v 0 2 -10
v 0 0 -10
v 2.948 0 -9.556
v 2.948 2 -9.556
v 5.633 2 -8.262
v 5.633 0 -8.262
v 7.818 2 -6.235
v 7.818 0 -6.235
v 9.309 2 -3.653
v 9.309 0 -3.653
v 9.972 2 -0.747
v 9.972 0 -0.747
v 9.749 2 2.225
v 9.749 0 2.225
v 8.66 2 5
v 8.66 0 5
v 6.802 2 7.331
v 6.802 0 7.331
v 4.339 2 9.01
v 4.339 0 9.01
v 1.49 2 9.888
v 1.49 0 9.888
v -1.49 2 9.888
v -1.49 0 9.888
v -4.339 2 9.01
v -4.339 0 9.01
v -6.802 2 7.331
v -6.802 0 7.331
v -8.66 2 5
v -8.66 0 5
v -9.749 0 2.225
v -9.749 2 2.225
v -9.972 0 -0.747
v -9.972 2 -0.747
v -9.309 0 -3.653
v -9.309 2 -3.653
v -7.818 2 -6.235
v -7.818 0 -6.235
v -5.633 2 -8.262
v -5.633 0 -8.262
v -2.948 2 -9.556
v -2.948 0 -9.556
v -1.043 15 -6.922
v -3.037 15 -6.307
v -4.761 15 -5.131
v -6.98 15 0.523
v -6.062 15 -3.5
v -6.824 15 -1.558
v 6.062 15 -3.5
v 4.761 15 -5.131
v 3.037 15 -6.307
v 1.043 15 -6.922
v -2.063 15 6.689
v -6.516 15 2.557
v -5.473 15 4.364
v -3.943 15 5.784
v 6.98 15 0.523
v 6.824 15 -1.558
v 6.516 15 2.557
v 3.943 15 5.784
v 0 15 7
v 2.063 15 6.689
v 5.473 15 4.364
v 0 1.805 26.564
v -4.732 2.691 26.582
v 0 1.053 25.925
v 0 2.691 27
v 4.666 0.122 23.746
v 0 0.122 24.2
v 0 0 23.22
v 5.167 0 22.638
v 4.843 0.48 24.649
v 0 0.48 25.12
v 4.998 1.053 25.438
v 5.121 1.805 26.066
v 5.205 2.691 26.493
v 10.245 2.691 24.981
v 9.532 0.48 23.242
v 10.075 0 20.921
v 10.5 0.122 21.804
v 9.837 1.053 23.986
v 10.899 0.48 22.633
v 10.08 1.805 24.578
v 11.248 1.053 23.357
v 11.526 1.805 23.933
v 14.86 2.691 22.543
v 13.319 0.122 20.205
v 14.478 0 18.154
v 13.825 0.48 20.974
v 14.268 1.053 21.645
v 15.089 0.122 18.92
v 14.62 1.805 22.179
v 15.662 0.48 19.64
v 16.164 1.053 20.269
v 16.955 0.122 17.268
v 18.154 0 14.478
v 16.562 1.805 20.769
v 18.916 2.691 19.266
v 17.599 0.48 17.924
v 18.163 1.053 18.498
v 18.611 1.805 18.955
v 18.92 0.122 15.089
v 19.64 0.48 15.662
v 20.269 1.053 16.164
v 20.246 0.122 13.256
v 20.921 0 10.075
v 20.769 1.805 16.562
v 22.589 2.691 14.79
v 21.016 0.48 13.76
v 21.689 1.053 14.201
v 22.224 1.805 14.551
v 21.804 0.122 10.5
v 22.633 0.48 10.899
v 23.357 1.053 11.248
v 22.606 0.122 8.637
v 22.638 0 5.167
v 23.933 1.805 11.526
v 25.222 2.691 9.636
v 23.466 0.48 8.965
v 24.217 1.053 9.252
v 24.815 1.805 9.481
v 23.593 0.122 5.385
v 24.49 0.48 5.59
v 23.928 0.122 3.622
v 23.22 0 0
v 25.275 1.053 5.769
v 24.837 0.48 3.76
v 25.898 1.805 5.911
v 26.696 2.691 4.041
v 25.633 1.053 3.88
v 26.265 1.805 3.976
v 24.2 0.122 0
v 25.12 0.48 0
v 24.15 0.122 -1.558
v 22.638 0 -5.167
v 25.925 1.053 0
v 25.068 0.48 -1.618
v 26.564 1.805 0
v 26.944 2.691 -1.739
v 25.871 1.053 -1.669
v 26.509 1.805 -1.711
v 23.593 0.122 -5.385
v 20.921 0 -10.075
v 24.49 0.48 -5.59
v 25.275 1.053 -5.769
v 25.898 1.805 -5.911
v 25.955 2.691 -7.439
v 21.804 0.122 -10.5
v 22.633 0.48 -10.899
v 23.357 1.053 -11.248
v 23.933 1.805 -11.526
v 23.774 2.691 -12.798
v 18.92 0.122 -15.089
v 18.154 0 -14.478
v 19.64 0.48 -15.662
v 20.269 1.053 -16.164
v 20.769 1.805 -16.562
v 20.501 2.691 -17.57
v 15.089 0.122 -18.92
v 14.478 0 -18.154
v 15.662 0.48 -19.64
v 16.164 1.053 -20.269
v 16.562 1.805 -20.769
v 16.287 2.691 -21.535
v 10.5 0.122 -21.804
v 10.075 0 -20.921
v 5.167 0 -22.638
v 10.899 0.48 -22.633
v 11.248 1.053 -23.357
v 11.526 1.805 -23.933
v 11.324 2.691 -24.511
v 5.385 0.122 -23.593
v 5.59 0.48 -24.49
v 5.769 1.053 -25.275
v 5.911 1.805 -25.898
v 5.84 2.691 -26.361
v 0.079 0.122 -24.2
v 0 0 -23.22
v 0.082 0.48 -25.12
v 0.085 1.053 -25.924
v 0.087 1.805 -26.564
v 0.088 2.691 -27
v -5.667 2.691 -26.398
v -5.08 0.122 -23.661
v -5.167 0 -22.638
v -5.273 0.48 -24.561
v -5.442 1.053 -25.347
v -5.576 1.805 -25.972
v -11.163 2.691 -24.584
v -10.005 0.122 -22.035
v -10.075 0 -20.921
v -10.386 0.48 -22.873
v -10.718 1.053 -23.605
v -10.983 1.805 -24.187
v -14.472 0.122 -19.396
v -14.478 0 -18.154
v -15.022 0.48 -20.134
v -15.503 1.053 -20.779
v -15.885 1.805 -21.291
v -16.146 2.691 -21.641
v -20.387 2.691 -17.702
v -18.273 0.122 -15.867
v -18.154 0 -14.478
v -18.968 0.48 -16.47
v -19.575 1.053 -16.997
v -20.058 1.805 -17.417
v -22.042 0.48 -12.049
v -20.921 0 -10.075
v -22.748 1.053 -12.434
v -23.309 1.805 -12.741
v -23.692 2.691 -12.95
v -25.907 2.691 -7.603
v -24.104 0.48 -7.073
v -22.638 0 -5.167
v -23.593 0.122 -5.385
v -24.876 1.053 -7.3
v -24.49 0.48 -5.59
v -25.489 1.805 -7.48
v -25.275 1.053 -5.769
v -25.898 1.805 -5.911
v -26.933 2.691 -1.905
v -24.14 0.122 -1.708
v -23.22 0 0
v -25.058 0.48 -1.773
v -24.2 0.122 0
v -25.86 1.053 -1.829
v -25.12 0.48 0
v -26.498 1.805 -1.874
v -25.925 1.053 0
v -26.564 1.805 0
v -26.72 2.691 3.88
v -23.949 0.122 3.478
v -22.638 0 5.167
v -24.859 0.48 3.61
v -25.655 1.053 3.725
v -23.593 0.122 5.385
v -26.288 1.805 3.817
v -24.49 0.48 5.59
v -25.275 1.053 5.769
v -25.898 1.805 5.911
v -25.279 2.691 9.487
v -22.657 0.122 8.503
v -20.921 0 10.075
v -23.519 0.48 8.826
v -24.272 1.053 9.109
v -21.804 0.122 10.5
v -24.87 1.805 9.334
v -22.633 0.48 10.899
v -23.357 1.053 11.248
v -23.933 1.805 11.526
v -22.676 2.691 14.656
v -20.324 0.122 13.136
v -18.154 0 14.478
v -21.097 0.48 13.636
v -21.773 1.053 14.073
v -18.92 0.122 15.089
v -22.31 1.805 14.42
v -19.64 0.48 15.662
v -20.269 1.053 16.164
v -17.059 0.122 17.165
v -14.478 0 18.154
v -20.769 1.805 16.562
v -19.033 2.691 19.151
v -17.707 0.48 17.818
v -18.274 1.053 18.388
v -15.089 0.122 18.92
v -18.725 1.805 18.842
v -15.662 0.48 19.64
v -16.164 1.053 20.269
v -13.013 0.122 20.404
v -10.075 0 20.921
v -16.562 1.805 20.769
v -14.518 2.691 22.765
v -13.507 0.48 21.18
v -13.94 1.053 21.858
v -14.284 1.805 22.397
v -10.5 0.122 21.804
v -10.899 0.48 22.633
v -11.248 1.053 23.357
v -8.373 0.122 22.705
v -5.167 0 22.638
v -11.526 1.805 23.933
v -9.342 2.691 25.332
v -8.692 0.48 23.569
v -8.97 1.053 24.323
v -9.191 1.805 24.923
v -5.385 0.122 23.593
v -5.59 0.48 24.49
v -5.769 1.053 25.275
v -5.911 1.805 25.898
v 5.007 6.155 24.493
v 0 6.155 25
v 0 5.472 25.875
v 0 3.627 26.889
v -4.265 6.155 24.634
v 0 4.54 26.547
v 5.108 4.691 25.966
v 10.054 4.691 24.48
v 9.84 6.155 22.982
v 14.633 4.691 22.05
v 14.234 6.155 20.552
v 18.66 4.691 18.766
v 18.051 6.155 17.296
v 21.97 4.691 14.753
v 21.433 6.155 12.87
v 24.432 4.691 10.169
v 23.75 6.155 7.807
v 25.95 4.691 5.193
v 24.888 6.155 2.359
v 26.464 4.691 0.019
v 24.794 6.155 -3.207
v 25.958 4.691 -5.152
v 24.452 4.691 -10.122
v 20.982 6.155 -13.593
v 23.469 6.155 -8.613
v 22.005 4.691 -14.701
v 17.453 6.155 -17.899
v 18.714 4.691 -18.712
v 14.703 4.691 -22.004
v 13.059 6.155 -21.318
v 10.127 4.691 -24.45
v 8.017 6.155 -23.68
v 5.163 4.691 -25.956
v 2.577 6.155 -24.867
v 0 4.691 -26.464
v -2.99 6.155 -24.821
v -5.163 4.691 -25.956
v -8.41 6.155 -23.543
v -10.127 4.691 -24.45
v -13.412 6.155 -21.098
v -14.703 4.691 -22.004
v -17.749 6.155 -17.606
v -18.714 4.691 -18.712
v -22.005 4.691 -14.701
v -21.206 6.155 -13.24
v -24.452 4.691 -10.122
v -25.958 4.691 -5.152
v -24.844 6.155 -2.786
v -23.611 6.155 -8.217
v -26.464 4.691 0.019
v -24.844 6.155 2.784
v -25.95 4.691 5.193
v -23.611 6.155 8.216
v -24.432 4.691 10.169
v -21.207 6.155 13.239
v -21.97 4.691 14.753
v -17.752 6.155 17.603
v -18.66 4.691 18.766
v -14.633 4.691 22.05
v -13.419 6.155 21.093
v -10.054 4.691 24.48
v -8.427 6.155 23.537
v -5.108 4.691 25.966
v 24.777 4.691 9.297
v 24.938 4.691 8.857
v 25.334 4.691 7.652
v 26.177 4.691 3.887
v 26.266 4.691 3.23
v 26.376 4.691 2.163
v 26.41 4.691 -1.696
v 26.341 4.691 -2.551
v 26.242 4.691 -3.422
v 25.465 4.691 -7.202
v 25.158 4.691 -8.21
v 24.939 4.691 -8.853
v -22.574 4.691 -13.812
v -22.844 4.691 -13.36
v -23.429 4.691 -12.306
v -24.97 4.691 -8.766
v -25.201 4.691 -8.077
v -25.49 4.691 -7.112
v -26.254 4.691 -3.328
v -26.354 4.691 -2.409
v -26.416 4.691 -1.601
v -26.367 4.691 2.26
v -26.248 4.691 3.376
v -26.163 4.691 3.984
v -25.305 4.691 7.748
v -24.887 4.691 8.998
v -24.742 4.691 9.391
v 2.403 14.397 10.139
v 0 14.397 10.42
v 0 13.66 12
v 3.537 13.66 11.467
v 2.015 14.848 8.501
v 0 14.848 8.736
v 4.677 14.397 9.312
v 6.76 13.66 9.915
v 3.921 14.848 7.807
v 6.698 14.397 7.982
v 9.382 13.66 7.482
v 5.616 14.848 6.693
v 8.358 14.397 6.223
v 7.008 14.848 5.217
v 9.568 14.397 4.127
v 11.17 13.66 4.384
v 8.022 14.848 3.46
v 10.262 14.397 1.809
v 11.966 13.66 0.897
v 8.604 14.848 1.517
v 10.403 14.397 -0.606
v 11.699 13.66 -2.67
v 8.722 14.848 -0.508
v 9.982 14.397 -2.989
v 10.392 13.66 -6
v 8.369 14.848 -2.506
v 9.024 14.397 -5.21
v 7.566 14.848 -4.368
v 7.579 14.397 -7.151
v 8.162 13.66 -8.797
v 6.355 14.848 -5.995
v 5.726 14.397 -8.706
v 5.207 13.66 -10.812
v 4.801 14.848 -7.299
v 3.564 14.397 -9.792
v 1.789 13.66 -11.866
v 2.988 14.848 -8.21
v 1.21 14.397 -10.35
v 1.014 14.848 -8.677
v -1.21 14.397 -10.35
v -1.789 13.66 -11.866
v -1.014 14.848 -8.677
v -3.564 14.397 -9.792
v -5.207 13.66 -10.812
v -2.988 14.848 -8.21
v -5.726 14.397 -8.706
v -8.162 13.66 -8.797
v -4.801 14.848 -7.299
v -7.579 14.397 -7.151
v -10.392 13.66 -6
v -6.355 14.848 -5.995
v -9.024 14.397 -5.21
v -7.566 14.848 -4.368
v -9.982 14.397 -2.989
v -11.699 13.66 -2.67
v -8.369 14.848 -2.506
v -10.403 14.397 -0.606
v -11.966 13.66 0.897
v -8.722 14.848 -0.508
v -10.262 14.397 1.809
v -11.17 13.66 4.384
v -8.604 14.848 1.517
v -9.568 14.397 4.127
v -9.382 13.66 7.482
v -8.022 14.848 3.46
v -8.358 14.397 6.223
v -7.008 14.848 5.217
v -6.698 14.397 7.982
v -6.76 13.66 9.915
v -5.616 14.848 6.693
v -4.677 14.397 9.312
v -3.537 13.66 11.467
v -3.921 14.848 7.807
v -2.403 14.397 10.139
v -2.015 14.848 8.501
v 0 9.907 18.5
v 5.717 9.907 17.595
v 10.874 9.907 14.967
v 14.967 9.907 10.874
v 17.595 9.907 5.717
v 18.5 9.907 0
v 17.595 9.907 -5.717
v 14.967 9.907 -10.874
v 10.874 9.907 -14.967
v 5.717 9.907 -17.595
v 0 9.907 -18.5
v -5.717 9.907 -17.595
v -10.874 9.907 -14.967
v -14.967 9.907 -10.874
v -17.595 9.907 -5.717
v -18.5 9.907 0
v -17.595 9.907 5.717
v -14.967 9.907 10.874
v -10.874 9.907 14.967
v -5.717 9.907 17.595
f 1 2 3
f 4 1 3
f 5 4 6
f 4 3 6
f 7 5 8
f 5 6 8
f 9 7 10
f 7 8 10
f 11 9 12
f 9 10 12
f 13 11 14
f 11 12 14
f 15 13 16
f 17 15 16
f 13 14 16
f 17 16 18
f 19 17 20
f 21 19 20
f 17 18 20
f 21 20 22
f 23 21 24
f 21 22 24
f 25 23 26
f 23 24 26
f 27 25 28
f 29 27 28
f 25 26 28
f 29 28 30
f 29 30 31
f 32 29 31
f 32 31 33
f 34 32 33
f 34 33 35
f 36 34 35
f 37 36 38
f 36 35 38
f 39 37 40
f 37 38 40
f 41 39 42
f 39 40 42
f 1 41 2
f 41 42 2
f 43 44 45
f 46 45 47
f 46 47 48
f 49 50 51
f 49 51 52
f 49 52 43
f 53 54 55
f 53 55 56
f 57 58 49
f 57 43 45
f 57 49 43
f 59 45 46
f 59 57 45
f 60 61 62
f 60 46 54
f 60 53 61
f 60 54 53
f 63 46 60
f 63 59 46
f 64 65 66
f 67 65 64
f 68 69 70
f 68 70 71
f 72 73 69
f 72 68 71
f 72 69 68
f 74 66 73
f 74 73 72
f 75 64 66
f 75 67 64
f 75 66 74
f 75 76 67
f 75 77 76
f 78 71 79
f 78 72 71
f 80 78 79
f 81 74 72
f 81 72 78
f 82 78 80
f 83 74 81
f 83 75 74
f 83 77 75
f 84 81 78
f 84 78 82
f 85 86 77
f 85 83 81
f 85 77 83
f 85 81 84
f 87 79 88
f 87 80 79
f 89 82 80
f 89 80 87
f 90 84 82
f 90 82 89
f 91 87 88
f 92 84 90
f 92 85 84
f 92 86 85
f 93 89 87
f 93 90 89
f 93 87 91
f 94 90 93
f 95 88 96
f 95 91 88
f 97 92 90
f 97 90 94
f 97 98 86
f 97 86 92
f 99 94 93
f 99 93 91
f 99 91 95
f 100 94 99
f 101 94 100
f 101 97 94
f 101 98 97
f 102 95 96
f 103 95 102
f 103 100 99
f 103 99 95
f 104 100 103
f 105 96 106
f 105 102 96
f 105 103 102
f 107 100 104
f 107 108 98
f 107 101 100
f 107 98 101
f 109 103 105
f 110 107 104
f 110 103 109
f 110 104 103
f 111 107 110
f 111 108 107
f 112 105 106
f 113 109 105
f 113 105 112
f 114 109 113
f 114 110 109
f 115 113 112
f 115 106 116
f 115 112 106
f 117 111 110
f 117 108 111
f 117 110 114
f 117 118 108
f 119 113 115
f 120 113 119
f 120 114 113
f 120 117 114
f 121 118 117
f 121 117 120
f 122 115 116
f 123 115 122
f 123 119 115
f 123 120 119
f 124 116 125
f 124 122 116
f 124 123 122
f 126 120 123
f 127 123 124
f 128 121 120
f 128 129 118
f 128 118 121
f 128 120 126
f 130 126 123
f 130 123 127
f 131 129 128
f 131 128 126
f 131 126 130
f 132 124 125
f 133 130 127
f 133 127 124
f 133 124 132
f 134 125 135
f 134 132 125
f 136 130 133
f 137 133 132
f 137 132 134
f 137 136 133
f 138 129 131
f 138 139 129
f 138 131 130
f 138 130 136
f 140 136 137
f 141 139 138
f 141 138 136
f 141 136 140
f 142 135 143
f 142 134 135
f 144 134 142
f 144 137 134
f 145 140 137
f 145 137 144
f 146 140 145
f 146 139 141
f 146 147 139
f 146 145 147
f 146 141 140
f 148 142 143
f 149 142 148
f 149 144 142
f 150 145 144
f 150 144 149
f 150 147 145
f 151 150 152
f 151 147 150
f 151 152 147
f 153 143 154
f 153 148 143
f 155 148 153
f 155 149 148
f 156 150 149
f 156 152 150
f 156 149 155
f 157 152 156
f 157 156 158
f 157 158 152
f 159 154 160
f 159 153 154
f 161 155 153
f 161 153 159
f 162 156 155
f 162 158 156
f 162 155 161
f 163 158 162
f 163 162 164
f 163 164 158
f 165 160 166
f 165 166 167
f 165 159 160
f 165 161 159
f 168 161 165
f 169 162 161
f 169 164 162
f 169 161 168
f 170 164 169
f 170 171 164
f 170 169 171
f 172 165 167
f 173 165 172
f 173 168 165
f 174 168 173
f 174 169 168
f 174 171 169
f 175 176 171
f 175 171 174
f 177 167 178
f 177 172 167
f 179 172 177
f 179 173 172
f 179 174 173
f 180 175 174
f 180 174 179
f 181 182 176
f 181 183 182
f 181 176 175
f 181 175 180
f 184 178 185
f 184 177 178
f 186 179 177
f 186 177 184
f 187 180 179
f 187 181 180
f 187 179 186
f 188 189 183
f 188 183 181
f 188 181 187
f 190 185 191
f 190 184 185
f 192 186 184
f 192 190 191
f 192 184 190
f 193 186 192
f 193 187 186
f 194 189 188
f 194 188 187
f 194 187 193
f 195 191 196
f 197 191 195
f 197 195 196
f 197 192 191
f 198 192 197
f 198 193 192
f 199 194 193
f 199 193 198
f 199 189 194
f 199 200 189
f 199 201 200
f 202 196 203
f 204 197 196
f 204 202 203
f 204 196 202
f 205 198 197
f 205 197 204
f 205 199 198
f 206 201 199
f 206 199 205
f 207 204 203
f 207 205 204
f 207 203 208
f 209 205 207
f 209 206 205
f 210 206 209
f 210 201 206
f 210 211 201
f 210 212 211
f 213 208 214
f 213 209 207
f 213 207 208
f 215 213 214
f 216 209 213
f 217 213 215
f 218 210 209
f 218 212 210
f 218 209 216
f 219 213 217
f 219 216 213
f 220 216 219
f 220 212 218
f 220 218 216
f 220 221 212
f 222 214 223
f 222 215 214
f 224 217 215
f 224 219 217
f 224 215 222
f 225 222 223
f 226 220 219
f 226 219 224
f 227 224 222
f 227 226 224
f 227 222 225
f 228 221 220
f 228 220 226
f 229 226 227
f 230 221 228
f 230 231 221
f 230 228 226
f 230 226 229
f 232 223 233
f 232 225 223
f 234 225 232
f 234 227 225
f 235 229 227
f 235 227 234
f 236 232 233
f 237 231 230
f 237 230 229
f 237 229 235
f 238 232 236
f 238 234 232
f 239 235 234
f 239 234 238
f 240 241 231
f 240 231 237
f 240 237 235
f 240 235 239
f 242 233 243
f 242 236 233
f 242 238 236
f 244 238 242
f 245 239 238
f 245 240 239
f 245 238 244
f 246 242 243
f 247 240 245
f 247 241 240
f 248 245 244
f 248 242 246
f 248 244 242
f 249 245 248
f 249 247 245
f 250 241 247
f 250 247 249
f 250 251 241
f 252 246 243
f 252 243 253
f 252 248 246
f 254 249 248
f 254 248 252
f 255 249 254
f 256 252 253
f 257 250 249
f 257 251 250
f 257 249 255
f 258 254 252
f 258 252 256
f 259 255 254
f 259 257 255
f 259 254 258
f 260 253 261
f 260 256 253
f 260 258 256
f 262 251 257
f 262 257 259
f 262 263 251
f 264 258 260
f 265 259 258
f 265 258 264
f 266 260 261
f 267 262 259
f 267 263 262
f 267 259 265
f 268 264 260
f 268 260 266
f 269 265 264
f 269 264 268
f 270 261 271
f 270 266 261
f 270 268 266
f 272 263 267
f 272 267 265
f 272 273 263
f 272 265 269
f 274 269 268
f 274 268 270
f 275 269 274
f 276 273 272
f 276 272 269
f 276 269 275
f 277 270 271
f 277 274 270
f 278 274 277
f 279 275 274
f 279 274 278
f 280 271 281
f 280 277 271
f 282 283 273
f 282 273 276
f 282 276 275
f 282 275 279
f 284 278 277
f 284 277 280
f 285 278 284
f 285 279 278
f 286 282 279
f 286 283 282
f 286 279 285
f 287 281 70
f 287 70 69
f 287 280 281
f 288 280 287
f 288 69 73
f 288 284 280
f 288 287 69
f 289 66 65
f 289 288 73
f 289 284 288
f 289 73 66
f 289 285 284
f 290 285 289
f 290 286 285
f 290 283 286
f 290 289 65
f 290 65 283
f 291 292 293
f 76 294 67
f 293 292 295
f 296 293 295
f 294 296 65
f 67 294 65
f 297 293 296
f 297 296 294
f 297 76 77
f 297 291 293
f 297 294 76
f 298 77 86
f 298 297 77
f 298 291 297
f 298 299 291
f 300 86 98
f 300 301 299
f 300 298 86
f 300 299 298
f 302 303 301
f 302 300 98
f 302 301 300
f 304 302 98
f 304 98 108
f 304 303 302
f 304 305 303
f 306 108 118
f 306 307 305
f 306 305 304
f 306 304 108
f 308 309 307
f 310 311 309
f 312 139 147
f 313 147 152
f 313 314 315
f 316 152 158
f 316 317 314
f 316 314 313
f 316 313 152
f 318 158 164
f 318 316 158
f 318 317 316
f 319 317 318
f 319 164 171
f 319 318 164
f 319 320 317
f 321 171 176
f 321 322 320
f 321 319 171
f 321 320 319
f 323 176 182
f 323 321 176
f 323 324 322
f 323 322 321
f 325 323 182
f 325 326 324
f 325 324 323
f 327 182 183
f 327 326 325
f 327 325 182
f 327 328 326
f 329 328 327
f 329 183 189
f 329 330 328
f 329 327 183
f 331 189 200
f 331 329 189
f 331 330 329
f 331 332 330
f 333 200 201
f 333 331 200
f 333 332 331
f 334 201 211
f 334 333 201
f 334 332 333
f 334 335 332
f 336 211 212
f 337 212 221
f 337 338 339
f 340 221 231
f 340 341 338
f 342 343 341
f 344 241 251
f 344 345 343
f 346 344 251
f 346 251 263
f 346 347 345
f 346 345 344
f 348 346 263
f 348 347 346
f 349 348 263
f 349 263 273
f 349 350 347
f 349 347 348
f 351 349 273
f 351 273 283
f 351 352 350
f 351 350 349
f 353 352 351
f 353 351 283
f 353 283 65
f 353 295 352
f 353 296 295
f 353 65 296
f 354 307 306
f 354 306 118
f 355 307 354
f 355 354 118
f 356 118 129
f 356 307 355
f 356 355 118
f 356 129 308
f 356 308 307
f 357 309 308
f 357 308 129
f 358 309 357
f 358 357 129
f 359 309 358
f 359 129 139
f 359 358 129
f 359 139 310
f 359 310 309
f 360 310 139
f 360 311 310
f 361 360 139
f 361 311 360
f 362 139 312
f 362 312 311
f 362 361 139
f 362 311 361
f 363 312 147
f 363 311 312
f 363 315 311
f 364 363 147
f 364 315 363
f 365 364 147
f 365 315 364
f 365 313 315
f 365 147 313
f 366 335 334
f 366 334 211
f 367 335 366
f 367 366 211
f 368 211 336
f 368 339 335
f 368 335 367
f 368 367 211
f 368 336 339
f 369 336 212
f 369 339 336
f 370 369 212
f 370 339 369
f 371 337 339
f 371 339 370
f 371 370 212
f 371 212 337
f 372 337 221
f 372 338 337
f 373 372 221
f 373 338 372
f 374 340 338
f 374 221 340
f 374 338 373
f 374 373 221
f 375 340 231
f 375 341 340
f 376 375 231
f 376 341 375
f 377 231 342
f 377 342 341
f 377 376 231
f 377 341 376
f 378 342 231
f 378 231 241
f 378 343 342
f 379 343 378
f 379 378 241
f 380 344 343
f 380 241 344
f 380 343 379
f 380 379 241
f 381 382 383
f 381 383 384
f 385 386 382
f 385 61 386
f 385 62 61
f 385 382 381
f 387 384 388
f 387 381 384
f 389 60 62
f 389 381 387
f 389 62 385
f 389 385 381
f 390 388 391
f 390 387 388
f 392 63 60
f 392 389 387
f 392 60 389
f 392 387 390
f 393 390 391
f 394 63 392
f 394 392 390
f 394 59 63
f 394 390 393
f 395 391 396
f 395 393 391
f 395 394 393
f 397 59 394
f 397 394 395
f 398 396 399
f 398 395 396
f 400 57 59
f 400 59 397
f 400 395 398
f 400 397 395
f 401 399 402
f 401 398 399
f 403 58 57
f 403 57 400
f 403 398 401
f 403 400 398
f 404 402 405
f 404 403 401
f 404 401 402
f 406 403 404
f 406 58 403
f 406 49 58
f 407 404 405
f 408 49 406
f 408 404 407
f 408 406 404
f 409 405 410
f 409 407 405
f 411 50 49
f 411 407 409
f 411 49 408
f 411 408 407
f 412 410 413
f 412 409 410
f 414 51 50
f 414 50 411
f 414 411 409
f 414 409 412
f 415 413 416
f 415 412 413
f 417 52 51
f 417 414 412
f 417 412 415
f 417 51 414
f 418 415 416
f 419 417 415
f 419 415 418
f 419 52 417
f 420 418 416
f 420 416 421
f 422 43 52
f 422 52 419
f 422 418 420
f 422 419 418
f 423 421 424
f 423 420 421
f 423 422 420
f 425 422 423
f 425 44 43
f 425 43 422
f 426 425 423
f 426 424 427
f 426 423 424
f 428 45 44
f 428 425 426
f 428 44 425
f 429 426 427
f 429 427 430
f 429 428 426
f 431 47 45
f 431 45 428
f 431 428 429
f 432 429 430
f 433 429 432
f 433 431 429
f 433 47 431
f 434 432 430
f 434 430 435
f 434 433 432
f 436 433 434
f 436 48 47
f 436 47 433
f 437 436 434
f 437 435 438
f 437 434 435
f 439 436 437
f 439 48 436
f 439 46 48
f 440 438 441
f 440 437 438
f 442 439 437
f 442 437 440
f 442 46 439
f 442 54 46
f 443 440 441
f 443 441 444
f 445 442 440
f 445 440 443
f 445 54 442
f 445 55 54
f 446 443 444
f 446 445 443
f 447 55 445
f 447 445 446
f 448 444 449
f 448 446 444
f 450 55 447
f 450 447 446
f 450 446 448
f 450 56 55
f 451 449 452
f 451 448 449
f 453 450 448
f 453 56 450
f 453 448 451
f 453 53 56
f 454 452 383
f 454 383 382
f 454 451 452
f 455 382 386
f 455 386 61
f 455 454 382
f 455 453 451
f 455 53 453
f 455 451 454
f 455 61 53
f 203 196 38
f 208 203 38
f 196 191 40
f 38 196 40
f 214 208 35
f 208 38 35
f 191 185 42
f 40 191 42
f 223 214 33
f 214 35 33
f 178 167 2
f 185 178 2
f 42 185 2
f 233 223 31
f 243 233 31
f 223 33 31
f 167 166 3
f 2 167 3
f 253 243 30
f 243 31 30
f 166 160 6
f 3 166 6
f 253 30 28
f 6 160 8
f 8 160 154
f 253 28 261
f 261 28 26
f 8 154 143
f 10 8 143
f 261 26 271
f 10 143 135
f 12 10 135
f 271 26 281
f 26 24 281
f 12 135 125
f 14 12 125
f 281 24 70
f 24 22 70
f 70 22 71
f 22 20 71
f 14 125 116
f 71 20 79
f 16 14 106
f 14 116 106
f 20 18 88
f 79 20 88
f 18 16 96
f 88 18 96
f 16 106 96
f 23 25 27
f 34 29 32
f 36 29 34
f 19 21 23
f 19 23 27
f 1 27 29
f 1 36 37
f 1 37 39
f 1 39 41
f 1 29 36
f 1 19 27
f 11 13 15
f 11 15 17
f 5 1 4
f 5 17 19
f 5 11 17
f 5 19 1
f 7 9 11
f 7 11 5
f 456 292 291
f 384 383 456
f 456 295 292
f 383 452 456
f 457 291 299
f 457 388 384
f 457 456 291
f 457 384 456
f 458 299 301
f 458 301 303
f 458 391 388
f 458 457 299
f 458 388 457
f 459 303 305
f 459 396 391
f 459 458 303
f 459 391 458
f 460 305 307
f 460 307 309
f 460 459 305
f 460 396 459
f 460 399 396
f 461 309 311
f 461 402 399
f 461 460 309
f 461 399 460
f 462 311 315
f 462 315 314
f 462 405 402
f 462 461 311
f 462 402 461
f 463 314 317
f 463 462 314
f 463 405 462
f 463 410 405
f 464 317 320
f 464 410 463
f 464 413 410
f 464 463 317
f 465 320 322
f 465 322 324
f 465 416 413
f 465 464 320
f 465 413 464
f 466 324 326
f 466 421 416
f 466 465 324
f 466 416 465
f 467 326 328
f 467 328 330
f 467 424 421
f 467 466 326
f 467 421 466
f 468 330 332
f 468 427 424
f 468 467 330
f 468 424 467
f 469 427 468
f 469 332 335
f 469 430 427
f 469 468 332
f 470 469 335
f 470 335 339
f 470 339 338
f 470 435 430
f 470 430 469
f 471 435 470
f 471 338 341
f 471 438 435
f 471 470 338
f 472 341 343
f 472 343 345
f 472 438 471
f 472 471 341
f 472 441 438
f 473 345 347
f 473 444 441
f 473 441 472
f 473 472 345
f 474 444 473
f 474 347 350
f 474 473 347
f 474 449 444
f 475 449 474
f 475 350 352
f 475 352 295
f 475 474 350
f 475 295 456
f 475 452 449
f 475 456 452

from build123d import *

# Parameters (mm, degrees)
IZIM1_R                     = 27
Y_KSEKLIK_EKSTR_ZYON1_DEPTH = 15
PAH1_SIZE                   = 10
PAH1_SIZE2                  = 17.320508076
RADYUS1_R                   = 10
RADYUS2_R                   = 4
RADYUS3_R                   = 4
IZIM2_R                     = 10
KES_EKSTR_ZYON1_DEPTH       = 2


with BuildPart() as part:
    # Çizim1 → Yükseklik-Ekstrüzyon1 (new body)
    with BuildSketch(Plane(origin=(0, 0, 0), x_dir=(1, 0, 0), z_dir=(0, 1, 0))):
        with Locations(Location((0, 0, 0), (0, 0, 270))):
            Circle(IZIM1_R)
    extrude(amount=Y_KSEKLIK_EKSTR_ZYON1_DEPTH)

    # Pah1
    pah1_edges = [part.edges().sort_by_distance(p)[0] for p in [
        (0, 15, -27),
    ]]
    pah1_side = [part.faces().sort_by_distance(p)[0] for p in [
        (0, 7.5, -27),
    ]]
    chamfer(pah1_edges, length=PAH1_SIZE, length2=PAH1_SIZE2, reference=pah1_side[0])

    # Radyus1
    radyus1_edges = [part.edges().sort_by_distance(p)[0] for p in [
        (0, 15, -9.679491924),
    ]]
    fillet(radyus1_edges, radius=RADYUS1_R)

    # Radyus2
    radyus2_edges = [part.edges().sort_by_distance(p)[0] for p in [
        (0, 5, -27),
    ]]
    fillet(radyus2_edges, radius=RADYUS2_R)

    # Radyus3
    # the kernel refuses this fillet: 4 mm, written as the material it takes off along each edge
    with BuildSketch(Plane(origin=(0, 0, 0), x_dir=(0, 0, 1), z_dir=(-1, 0, 0))) as radyus3_piece_1:
        with BuildLine():
            CenterArc((23.220386989, 4), RADYUS3_R, 270, 70.891973705)
            Line((23.220386989, 0), (23.220386989, -0.08))
            Line((23.220386989, -0.08), (27, -0.08))
            Line((27, -0.08), (27.08, 0))
            ThreePointArc((27.08, 0), (27.08, 1.345299462), (27.075591492, 2.664410902))
            Line((27.075591492, 2.664410902), (26.999999247, 2.690598923))
        make_face()
    revolve(axis=Axis((0, 0, 0), (0, 1, 0)), mode=Mode.SUBTRACT)

    # Çizim2 → Kes-Ekstrüzyon1 (cut)
    with BuildSketch(Plane.XZ):
        with Locations(Location((0, 0, 0), (0, 0, 270))):
            Circle(IZIM2_R)
    extrude(amount=-KES_EKSTR_ZYON1_DEPTH, mode=Mode.SUBTRACT)


solid = part.part
